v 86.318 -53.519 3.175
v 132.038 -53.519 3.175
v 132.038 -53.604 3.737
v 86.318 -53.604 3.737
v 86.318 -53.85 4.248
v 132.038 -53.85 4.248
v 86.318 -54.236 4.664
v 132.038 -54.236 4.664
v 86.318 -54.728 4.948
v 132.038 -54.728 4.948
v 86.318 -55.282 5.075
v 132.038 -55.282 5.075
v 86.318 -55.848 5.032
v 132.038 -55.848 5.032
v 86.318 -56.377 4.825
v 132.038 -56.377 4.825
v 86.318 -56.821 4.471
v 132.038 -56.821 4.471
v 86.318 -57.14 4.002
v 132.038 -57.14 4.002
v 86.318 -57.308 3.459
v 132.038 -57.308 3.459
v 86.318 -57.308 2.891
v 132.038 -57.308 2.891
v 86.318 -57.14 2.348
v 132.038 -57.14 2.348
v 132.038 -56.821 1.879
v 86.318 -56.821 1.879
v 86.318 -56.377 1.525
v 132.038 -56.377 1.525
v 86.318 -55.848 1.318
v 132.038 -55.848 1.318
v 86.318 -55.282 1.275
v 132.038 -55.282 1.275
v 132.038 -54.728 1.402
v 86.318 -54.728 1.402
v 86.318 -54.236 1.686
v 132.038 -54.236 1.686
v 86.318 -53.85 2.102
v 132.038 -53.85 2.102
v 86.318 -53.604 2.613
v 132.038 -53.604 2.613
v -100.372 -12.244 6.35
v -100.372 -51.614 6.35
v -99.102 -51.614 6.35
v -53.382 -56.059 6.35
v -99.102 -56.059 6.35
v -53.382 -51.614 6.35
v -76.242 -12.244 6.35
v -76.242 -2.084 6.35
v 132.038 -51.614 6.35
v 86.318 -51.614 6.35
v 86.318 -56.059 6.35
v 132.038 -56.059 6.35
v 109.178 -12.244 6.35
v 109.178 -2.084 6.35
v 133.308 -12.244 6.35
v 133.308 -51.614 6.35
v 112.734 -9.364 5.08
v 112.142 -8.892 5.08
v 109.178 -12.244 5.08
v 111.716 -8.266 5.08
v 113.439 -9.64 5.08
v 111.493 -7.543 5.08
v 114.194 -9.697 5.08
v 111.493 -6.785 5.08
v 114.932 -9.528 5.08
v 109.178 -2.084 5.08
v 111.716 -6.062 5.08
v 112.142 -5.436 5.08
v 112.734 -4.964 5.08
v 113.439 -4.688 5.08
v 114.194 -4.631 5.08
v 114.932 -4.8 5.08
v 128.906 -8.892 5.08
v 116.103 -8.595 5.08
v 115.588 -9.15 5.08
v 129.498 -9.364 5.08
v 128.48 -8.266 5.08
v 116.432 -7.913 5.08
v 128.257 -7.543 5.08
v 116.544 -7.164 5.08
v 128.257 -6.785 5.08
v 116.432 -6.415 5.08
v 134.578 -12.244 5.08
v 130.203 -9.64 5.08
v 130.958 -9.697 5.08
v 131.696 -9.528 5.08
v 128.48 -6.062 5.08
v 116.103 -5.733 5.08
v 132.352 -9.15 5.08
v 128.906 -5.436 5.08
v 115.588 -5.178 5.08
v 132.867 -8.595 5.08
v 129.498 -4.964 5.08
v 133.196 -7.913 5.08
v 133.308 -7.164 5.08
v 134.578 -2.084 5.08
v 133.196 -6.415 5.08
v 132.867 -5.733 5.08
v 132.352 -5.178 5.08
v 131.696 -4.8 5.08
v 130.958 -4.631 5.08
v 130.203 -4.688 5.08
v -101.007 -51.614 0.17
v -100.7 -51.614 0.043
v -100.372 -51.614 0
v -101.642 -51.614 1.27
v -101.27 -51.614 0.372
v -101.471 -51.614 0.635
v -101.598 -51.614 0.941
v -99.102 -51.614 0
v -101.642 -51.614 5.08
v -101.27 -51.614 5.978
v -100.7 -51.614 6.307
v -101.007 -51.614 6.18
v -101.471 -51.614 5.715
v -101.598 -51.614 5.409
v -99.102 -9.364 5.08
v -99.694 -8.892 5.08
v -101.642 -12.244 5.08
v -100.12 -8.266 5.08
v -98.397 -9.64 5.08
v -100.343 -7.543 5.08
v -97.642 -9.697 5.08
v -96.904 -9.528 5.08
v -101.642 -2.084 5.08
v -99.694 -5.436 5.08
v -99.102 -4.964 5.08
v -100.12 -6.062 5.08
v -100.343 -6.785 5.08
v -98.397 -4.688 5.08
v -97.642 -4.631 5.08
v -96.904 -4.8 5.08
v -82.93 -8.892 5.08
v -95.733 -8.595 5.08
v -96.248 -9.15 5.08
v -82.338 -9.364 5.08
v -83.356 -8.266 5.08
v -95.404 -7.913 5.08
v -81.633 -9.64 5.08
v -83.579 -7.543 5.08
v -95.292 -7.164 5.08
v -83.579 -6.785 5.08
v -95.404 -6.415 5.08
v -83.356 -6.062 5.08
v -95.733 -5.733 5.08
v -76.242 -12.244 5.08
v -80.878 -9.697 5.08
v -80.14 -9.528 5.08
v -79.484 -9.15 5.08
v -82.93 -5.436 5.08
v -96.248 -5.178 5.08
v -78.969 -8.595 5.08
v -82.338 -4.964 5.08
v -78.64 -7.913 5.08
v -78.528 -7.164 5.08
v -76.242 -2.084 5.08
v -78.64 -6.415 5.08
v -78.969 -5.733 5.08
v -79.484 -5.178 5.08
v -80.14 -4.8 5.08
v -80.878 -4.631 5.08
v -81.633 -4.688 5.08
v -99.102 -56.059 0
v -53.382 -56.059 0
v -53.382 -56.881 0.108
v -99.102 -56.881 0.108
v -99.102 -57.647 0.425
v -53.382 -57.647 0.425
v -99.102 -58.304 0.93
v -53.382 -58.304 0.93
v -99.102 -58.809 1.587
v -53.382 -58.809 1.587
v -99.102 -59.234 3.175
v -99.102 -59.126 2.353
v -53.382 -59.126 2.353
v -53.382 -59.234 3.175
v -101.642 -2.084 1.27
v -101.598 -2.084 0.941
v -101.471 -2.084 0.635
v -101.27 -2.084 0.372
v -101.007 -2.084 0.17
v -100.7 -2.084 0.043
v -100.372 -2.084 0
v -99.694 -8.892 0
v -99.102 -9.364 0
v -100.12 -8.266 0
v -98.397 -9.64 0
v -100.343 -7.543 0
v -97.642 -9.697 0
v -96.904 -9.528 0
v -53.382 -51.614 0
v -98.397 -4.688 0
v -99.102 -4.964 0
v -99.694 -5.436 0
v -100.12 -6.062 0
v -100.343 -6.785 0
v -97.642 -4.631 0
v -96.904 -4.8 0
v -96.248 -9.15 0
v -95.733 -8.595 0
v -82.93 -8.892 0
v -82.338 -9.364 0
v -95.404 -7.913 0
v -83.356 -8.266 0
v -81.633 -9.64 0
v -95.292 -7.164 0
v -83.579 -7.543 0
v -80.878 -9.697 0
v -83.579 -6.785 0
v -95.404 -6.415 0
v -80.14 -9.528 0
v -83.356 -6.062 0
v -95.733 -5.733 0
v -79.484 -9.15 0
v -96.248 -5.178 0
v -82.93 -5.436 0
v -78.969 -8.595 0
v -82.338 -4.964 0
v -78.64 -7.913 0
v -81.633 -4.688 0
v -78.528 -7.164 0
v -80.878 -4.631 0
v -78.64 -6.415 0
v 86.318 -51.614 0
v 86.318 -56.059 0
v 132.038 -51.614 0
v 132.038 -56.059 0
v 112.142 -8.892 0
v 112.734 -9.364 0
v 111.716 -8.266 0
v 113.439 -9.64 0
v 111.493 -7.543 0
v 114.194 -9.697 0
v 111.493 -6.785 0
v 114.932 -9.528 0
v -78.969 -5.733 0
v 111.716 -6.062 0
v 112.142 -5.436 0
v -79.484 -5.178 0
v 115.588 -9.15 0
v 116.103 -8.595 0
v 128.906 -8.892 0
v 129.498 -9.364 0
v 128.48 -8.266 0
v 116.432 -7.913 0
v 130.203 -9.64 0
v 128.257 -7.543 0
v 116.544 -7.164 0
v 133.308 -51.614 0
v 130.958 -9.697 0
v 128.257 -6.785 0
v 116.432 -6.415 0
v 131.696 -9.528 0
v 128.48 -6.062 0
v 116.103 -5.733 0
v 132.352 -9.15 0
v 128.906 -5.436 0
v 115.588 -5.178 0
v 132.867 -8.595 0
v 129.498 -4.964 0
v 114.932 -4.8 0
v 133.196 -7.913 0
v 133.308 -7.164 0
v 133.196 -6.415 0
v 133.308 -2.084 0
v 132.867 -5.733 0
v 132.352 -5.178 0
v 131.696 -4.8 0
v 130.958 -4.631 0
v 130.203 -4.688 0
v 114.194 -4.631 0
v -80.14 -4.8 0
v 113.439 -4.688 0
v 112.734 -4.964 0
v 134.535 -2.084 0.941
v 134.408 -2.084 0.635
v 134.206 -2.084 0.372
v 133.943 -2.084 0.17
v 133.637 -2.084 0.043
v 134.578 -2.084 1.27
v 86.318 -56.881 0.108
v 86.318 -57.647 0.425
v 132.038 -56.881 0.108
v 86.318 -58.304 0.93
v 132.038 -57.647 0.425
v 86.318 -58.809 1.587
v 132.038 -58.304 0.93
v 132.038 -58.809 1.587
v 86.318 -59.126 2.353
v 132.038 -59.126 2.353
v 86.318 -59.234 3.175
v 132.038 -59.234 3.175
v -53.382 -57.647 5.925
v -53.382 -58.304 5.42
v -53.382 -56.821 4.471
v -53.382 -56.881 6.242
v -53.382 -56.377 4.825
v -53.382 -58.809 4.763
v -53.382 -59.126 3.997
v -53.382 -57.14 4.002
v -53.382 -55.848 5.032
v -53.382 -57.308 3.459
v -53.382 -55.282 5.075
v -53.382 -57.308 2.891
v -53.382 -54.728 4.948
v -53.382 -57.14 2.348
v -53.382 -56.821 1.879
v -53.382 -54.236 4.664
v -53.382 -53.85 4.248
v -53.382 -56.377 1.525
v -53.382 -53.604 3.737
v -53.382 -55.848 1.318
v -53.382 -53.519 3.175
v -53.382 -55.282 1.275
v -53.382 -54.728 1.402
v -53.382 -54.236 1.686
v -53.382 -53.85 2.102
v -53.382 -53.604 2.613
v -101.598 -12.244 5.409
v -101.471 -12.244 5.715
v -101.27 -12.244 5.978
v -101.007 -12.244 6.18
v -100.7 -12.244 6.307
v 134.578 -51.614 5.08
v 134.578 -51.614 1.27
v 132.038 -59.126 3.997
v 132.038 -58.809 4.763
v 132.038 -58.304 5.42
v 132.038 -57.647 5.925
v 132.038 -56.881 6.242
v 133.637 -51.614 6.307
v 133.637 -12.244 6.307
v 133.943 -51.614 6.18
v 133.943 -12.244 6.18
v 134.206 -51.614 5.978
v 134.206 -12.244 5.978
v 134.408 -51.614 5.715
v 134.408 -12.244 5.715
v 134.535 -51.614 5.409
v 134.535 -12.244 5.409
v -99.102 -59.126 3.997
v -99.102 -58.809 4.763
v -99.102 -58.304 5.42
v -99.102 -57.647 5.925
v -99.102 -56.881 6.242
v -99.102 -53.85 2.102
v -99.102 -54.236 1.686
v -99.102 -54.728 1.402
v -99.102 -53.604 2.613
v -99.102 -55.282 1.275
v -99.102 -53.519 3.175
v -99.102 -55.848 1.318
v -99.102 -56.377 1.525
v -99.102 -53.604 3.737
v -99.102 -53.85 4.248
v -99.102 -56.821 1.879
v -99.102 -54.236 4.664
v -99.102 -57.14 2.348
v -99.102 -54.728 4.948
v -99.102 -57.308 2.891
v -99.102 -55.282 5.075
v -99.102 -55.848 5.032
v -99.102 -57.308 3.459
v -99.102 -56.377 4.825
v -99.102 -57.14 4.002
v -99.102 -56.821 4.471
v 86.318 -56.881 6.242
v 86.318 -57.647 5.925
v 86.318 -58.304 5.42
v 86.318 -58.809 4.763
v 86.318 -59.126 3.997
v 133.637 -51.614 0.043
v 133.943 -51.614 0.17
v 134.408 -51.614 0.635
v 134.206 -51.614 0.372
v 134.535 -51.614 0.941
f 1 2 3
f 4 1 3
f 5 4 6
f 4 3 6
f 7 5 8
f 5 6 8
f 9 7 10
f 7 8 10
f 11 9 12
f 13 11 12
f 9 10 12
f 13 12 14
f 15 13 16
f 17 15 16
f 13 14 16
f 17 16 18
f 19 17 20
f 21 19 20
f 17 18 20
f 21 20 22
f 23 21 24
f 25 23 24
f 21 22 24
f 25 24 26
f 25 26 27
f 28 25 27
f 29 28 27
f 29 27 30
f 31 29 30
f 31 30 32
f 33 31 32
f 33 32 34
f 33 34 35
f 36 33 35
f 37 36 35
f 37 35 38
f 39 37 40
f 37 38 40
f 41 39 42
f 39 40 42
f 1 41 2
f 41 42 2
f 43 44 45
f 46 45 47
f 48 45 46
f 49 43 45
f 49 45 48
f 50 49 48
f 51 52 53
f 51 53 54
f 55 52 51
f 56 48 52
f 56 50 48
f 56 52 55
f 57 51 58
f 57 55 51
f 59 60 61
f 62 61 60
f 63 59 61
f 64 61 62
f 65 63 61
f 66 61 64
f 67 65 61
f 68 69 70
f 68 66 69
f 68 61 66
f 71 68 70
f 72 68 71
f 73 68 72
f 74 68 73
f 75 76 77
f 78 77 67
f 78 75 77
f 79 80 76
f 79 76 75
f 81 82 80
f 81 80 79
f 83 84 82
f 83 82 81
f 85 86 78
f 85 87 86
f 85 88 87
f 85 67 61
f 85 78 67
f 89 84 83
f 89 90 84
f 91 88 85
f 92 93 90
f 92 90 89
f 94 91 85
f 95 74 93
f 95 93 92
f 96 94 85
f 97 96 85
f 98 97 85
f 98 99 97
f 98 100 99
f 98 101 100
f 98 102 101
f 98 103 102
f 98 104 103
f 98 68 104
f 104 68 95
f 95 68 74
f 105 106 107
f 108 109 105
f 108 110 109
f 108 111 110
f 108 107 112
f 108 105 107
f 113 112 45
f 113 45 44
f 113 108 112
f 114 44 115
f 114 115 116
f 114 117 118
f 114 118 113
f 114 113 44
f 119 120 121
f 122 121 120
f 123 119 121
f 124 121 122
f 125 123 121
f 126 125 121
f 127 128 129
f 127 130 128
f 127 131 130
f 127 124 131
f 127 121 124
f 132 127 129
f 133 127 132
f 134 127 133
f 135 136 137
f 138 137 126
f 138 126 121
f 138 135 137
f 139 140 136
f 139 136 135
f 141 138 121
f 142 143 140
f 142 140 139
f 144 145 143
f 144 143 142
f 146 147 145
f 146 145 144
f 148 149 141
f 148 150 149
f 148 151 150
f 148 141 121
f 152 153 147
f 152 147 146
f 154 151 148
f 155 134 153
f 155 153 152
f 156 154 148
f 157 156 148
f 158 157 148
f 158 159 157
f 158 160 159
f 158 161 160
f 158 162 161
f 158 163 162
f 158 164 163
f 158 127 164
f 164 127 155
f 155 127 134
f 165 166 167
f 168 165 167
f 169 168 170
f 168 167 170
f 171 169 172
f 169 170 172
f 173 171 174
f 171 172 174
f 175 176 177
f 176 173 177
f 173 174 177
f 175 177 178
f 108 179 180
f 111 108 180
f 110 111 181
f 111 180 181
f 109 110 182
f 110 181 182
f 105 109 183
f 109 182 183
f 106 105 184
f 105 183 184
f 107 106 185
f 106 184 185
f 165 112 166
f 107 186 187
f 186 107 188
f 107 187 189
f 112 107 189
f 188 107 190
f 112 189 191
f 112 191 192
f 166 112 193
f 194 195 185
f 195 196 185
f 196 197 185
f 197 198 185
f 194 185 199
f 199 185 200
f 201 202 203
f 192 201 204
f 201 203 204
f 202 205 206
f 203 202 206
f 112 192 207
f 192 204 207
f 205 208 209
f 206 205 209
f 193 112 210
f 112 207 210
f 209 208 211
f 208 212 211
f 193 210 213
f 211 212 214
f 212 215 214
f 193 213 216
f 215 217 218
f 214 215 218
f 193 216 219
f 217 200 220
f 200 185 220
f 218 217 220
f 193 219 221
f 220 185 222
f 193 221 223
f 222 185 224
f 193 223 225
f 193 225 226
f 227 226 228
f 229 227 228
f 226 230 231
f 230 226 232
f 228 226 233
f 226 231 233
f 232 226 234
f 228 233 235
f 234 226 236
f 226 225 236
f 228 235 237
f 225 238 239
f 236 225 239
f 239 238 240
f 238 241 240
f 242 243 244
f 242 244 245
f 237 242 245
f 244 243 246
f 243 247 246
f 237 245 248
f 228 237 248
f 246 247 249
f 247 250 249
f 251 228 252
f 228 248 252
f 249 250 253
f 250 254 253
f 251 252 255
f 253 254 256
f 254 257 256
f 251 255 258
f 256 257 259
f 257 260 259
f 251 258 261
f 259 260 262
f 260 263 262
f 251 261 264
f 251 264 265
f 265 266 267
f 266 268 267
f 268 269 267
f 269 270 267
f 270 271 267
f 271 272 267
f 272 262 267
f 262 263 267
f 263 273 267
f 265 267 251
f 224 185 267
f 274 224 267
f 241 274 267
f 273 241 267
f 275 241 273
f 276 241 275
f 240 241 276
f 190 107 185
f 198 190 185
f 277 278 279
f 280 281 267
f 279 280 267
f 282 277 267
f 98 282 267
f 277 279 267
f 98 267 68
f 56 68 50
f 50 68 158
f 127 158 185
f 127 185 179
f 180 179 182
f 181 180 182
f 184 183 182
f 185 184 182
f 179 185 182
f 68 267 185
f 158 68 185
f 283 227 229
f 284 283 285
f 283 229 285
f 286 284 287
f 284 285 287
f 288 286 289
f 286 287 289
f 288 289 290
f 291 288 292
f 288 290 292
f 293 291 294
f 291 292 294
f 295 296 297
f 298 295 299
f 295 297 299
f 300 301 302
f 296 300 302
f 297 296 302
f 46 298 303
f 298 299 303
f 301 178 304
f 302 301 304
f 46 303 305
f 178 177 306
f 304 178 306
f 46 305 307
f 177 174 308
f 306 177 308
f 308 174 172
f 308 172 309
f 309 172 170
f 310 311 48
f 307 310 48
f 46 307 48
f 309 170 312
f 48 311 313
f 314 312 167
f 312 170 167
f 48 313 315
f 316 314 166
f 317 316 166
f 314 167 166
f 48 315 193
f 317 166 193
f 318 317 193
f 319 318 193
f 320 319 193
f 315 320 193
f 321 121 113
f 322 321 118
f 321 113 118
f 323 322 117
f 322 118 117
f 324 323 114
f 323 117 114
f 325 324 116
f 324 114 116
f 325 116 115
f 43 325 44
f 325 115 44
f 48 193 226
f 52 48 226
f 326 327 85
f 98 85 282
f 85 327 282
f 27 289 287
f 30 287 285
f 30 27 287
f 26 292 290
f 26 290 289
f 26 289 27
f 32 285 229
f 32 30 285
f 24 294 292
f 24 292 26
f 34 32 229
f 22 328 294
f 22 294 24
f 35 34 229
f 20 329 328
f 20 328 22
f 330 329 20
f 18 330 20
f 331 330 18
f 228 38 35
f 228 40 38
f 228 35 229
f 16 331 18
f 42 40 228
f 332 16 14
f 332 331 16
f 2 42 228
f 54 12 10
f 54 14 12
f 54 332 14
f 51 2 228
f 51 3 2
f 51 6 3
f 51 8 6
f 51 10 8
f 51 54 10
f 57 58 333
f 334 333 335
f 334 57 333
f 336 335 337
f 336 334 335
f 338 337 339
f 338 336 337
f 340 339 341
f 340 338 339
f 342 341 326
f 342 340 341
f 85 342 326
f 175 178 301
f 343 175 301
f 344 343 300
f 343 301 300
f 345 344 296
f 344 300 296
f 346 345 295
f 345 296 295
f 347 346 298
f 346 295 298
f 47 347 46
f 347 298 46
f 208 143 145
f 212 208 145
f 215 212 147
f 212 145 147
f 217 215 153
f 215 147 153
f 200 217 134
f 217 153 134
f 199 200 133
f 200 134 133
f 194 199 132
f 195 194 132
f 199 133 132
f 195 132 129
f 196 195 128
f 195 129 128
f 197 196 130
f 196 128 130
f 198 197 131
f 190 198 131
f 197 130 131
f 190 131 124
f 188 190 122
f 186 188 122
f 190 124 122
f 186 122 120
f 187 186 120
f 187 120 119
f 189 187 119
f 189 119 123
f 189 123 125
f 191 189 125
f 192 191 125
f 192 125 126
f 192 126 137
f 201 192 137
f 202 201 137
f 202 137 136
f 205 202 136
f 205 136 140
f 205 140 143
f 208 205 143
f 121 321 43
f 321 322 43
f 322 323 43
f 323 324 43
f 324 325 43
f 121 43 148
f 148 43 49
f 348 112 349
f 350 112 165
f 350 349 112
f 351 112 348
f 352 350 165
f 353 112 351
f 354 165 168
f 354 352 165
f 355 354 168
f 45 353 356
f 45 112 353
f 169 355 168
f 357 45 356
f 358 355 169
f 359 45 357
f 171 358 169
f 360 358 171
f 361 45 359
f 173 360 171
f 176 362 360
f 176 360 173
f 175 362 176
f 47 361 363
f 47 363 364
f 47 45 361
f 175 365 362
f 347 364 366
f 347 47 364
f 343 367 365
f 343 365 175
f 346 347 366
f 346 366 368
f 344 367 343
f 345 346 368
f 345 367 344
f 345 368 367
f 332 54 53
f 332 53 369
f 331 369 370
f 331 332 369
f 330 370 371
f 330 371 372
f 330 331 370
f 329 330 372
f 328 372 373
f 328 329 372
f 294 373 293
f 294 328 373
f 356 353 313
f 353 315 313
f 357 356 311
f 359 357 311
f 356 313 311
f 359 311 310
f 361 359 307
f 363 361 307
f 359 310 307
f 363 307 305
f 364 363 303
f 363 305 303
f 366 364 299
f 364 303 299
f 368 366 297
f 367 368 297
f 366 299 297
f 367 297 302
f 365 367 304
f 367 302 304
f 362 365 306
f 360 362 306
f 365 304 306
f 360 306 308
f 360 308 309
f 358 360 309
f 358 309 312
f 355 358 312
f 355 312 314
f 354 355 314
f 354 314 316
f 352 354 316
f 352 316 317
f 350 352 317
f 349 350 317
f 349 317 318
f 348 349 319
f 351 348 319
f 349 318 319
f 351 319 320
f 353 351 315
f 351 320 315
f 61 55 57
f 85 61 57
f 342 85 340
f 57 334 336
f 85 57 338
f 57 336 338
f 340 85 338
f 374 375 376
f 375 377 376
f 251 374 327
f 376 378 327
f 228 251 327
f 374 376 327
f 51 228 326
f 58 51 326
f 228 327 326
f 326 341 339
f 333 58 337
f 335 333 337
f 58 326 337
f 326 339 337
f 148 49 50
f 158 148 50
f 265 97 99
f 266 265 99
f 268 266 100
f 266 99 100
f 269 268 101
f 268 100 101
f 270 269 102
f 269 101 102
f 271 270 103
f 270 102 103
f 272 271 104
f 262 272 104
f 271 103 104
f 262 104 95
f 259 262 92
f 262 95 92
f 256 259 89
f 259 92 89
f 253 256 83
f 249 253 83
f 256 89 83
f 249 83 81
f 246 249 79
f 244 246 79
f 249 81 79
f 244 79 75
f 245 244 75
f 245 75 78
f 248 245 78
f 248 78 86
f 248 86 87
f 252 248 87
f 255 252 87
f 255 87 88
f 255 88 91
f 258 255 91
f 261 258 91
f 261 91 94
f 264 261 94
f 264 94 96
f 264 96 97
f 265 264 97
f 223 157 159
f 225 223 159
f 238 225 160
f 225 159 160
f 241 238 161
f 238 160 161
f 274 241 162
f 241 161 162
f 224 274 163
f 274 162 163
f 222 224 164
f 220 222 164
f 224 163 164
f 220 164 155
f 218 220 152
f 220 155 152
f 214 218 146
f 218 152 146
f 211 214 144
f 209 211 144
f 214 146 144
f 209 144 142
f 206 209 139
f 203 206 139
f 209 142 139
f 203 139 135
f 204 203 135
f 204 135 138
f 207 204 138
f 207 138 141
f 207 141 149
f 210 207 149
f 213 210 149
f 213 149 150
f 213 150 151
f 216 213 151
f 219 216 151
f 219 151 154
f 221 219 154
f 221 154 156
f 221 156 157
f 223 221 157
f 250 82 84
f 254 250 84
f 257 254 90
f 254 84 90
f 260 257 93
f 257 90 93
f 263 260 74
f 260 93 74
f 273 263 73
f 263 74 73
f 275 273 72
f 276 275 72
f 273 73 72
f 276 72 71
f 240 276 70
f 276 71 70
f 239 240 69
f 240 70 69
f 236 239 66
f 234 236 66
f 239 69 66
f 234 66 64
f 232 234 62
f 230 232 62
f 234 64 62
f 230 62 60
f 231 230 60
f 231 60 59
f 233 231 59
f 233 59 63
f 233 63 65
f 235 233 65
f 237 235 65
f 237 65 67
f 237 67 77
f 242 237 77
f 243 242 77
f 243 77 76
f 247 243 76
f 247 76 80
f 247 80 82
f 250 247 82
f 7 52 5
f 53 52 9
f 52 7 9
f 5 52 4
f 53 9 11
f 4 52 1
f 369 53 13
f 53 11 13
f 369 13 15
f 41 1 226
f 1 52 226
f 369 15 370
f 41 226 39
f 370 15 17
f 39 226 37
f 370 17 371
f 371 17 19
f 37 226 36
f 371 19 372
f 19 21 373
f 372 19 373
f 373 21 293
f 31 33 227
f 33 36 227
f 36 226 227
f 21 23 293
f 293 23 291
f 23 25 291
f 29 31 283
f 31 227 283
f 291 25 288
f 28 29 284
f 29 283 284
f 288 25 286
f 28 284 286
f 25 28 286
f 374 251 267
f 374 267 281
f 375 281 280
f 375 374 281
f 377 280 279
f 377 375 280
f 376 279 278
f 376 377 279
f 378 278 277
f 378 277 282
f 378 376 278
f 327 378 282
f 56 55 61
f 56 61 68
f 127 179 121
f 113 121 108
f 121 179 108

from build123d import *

# Parameters (mm, degrees)
F1_DEPTH  = 6.35
F2_W      = 25.4
F2_H      = 10.16
F3_DEPTH  = 1.27
F4_R      = 2.54
F5_DEPTH  = 25.4
F6_R      = 2.54
F7_DEPTH  = 25.4
F8_R      = 1.905
F9_DEPTH  = 254
F10_R     = 3.17499
F11_R     = 1.26999
F12_W     = 10.7186027977
F12_H     = 11.3617175813
F13_DEPTH = 2.54
F14_W     = 7.8115976844
F14_H     = 7.0746540246
F15_DEPTH = 2.54


# Not quite as in the source:
# - a fillet or chamfer is up to 0.001 mm smaller than in the source, because OpenCascade refuses the exact size


with BuildPart() as f1:
    # F0 (on Top) → F1 (new body)
    with BuildSketch(Plane.XY):
        Polygon((-53.3815915518, -2.0840423941), (-101.6415915518, -2.0840423941), (-101.6415915518, -51.6140423941), (-101.6415915518, -59.2340423941), (-53.3815915518, -59.2340423941), (-53.3815915518, -51.6140423941), (86.3184084482, -51.6140423941), (86.3184084482, -59.2340423941), (134.5784084482, -59.2340423941), (134.5784084482, -51.6140423941), (134.5784084482, -2.0840423941), (86.3184084482, -2.0840423941), align=None)
    extrude(amount=F1_DEPTH)

    # F2 (on face) → F3 (cut)
    with BuildSketch(Plane.XY.offset(6.35)):
        with Locations((-88.9415915518, -7.1640423941)):
            Rectangle(F2_W, F2_H)
        with Locations((121.8784084482, -7.1640423941)):
            Rectangle(F2_W, F2_H)
    extrude(amount=-F3_DEPTH, mode=Mode.SUBTRACT)

    # F4 (on face) → F5 (cut)
    with BuildSketch(Plane.XY.offset(5.08)):
        with Locations((-97.8315915518, -7.1640423941)):
            Circle(F4_R)
        with Locations((-81.0675915518, -7.1640423941)):
            Circle(F4_R)
    extrude(amount=-F5_DEPTH, mode=Mode.SUBTRACT)

    # F6 (on face) → F7 (cut)
    with BuildSketch(Plane.XY.offset(5.08)):
        with Locations((130.7684084482, -7.1640423941)):
            Circle(F6_R)
        with Locations((114.0044084482, -7.1640423941)):
            Circle(F6_R)
    extrude(amount=-F7_DEPTH, mode=Mode.SUBTRACT)

    # F8 (on face) → F9 (cut, symmetric)
    with BuildSketch(Plane.YZ.offset(-53.3815915518)):
        with Locations((-55.4240423941, 3.175)):
            Circle(F8_R)
    extrude(amount=F9_DEPTH, both=True, mode=Mode.SUBTRACT)

    # F10 (radius 3.175 in the source; OpenCascade refuses exactly that, so slightly less here)
    f10_edges = [f1.edges().sort_by_distance(p)[0] for p in [
        (-77.511592, -59.234042, 6.35),
        (-77.511592, -59.234042, 0),
        (110.448408, -59.234042, 6.35),
        (110.448408, -59.234042, 0),
    ]]
    fillet(f10_edges, radius=F10_R)

    # F11 (radius 1.27 in the source; OpenCascade refuses exactly that, so slightly less here)
    f11_edges = [f1.edges().sort_by_distance(p)[0] for p in [
        (-101.641592, -34.151547, 6.35),
        (134.578408, -34.151547, 6.35),
    ]]
    fillet(f11_edges, radius=F11_R)

    # F12 (on face) → F13 (cut)
    with BuildSketch(Plane(origin=(-101.6415915518, 0, 0), x_dir=(0, -1, 0), z_dir=(-1, 0, 0))):
        with Locations((56.973343793, 2.878480358)):
            Rectangle(F12_W, F12_H)
    extrude(amount=-F13_DEPTH, mode=Mode.SUBTRACT)

    # F14 (on face) → F15 (cut)
    with BuildSketch(Plane.YZ.offset(134.5784084482)):
        with Locations((-55.5198412363, 2.9937927611)):
            Rectangle(F14_W, F14_H)
    extrude(amount=-F15_DEPTH, mode=Mode.SUBTRACT)


solid = f1.part
